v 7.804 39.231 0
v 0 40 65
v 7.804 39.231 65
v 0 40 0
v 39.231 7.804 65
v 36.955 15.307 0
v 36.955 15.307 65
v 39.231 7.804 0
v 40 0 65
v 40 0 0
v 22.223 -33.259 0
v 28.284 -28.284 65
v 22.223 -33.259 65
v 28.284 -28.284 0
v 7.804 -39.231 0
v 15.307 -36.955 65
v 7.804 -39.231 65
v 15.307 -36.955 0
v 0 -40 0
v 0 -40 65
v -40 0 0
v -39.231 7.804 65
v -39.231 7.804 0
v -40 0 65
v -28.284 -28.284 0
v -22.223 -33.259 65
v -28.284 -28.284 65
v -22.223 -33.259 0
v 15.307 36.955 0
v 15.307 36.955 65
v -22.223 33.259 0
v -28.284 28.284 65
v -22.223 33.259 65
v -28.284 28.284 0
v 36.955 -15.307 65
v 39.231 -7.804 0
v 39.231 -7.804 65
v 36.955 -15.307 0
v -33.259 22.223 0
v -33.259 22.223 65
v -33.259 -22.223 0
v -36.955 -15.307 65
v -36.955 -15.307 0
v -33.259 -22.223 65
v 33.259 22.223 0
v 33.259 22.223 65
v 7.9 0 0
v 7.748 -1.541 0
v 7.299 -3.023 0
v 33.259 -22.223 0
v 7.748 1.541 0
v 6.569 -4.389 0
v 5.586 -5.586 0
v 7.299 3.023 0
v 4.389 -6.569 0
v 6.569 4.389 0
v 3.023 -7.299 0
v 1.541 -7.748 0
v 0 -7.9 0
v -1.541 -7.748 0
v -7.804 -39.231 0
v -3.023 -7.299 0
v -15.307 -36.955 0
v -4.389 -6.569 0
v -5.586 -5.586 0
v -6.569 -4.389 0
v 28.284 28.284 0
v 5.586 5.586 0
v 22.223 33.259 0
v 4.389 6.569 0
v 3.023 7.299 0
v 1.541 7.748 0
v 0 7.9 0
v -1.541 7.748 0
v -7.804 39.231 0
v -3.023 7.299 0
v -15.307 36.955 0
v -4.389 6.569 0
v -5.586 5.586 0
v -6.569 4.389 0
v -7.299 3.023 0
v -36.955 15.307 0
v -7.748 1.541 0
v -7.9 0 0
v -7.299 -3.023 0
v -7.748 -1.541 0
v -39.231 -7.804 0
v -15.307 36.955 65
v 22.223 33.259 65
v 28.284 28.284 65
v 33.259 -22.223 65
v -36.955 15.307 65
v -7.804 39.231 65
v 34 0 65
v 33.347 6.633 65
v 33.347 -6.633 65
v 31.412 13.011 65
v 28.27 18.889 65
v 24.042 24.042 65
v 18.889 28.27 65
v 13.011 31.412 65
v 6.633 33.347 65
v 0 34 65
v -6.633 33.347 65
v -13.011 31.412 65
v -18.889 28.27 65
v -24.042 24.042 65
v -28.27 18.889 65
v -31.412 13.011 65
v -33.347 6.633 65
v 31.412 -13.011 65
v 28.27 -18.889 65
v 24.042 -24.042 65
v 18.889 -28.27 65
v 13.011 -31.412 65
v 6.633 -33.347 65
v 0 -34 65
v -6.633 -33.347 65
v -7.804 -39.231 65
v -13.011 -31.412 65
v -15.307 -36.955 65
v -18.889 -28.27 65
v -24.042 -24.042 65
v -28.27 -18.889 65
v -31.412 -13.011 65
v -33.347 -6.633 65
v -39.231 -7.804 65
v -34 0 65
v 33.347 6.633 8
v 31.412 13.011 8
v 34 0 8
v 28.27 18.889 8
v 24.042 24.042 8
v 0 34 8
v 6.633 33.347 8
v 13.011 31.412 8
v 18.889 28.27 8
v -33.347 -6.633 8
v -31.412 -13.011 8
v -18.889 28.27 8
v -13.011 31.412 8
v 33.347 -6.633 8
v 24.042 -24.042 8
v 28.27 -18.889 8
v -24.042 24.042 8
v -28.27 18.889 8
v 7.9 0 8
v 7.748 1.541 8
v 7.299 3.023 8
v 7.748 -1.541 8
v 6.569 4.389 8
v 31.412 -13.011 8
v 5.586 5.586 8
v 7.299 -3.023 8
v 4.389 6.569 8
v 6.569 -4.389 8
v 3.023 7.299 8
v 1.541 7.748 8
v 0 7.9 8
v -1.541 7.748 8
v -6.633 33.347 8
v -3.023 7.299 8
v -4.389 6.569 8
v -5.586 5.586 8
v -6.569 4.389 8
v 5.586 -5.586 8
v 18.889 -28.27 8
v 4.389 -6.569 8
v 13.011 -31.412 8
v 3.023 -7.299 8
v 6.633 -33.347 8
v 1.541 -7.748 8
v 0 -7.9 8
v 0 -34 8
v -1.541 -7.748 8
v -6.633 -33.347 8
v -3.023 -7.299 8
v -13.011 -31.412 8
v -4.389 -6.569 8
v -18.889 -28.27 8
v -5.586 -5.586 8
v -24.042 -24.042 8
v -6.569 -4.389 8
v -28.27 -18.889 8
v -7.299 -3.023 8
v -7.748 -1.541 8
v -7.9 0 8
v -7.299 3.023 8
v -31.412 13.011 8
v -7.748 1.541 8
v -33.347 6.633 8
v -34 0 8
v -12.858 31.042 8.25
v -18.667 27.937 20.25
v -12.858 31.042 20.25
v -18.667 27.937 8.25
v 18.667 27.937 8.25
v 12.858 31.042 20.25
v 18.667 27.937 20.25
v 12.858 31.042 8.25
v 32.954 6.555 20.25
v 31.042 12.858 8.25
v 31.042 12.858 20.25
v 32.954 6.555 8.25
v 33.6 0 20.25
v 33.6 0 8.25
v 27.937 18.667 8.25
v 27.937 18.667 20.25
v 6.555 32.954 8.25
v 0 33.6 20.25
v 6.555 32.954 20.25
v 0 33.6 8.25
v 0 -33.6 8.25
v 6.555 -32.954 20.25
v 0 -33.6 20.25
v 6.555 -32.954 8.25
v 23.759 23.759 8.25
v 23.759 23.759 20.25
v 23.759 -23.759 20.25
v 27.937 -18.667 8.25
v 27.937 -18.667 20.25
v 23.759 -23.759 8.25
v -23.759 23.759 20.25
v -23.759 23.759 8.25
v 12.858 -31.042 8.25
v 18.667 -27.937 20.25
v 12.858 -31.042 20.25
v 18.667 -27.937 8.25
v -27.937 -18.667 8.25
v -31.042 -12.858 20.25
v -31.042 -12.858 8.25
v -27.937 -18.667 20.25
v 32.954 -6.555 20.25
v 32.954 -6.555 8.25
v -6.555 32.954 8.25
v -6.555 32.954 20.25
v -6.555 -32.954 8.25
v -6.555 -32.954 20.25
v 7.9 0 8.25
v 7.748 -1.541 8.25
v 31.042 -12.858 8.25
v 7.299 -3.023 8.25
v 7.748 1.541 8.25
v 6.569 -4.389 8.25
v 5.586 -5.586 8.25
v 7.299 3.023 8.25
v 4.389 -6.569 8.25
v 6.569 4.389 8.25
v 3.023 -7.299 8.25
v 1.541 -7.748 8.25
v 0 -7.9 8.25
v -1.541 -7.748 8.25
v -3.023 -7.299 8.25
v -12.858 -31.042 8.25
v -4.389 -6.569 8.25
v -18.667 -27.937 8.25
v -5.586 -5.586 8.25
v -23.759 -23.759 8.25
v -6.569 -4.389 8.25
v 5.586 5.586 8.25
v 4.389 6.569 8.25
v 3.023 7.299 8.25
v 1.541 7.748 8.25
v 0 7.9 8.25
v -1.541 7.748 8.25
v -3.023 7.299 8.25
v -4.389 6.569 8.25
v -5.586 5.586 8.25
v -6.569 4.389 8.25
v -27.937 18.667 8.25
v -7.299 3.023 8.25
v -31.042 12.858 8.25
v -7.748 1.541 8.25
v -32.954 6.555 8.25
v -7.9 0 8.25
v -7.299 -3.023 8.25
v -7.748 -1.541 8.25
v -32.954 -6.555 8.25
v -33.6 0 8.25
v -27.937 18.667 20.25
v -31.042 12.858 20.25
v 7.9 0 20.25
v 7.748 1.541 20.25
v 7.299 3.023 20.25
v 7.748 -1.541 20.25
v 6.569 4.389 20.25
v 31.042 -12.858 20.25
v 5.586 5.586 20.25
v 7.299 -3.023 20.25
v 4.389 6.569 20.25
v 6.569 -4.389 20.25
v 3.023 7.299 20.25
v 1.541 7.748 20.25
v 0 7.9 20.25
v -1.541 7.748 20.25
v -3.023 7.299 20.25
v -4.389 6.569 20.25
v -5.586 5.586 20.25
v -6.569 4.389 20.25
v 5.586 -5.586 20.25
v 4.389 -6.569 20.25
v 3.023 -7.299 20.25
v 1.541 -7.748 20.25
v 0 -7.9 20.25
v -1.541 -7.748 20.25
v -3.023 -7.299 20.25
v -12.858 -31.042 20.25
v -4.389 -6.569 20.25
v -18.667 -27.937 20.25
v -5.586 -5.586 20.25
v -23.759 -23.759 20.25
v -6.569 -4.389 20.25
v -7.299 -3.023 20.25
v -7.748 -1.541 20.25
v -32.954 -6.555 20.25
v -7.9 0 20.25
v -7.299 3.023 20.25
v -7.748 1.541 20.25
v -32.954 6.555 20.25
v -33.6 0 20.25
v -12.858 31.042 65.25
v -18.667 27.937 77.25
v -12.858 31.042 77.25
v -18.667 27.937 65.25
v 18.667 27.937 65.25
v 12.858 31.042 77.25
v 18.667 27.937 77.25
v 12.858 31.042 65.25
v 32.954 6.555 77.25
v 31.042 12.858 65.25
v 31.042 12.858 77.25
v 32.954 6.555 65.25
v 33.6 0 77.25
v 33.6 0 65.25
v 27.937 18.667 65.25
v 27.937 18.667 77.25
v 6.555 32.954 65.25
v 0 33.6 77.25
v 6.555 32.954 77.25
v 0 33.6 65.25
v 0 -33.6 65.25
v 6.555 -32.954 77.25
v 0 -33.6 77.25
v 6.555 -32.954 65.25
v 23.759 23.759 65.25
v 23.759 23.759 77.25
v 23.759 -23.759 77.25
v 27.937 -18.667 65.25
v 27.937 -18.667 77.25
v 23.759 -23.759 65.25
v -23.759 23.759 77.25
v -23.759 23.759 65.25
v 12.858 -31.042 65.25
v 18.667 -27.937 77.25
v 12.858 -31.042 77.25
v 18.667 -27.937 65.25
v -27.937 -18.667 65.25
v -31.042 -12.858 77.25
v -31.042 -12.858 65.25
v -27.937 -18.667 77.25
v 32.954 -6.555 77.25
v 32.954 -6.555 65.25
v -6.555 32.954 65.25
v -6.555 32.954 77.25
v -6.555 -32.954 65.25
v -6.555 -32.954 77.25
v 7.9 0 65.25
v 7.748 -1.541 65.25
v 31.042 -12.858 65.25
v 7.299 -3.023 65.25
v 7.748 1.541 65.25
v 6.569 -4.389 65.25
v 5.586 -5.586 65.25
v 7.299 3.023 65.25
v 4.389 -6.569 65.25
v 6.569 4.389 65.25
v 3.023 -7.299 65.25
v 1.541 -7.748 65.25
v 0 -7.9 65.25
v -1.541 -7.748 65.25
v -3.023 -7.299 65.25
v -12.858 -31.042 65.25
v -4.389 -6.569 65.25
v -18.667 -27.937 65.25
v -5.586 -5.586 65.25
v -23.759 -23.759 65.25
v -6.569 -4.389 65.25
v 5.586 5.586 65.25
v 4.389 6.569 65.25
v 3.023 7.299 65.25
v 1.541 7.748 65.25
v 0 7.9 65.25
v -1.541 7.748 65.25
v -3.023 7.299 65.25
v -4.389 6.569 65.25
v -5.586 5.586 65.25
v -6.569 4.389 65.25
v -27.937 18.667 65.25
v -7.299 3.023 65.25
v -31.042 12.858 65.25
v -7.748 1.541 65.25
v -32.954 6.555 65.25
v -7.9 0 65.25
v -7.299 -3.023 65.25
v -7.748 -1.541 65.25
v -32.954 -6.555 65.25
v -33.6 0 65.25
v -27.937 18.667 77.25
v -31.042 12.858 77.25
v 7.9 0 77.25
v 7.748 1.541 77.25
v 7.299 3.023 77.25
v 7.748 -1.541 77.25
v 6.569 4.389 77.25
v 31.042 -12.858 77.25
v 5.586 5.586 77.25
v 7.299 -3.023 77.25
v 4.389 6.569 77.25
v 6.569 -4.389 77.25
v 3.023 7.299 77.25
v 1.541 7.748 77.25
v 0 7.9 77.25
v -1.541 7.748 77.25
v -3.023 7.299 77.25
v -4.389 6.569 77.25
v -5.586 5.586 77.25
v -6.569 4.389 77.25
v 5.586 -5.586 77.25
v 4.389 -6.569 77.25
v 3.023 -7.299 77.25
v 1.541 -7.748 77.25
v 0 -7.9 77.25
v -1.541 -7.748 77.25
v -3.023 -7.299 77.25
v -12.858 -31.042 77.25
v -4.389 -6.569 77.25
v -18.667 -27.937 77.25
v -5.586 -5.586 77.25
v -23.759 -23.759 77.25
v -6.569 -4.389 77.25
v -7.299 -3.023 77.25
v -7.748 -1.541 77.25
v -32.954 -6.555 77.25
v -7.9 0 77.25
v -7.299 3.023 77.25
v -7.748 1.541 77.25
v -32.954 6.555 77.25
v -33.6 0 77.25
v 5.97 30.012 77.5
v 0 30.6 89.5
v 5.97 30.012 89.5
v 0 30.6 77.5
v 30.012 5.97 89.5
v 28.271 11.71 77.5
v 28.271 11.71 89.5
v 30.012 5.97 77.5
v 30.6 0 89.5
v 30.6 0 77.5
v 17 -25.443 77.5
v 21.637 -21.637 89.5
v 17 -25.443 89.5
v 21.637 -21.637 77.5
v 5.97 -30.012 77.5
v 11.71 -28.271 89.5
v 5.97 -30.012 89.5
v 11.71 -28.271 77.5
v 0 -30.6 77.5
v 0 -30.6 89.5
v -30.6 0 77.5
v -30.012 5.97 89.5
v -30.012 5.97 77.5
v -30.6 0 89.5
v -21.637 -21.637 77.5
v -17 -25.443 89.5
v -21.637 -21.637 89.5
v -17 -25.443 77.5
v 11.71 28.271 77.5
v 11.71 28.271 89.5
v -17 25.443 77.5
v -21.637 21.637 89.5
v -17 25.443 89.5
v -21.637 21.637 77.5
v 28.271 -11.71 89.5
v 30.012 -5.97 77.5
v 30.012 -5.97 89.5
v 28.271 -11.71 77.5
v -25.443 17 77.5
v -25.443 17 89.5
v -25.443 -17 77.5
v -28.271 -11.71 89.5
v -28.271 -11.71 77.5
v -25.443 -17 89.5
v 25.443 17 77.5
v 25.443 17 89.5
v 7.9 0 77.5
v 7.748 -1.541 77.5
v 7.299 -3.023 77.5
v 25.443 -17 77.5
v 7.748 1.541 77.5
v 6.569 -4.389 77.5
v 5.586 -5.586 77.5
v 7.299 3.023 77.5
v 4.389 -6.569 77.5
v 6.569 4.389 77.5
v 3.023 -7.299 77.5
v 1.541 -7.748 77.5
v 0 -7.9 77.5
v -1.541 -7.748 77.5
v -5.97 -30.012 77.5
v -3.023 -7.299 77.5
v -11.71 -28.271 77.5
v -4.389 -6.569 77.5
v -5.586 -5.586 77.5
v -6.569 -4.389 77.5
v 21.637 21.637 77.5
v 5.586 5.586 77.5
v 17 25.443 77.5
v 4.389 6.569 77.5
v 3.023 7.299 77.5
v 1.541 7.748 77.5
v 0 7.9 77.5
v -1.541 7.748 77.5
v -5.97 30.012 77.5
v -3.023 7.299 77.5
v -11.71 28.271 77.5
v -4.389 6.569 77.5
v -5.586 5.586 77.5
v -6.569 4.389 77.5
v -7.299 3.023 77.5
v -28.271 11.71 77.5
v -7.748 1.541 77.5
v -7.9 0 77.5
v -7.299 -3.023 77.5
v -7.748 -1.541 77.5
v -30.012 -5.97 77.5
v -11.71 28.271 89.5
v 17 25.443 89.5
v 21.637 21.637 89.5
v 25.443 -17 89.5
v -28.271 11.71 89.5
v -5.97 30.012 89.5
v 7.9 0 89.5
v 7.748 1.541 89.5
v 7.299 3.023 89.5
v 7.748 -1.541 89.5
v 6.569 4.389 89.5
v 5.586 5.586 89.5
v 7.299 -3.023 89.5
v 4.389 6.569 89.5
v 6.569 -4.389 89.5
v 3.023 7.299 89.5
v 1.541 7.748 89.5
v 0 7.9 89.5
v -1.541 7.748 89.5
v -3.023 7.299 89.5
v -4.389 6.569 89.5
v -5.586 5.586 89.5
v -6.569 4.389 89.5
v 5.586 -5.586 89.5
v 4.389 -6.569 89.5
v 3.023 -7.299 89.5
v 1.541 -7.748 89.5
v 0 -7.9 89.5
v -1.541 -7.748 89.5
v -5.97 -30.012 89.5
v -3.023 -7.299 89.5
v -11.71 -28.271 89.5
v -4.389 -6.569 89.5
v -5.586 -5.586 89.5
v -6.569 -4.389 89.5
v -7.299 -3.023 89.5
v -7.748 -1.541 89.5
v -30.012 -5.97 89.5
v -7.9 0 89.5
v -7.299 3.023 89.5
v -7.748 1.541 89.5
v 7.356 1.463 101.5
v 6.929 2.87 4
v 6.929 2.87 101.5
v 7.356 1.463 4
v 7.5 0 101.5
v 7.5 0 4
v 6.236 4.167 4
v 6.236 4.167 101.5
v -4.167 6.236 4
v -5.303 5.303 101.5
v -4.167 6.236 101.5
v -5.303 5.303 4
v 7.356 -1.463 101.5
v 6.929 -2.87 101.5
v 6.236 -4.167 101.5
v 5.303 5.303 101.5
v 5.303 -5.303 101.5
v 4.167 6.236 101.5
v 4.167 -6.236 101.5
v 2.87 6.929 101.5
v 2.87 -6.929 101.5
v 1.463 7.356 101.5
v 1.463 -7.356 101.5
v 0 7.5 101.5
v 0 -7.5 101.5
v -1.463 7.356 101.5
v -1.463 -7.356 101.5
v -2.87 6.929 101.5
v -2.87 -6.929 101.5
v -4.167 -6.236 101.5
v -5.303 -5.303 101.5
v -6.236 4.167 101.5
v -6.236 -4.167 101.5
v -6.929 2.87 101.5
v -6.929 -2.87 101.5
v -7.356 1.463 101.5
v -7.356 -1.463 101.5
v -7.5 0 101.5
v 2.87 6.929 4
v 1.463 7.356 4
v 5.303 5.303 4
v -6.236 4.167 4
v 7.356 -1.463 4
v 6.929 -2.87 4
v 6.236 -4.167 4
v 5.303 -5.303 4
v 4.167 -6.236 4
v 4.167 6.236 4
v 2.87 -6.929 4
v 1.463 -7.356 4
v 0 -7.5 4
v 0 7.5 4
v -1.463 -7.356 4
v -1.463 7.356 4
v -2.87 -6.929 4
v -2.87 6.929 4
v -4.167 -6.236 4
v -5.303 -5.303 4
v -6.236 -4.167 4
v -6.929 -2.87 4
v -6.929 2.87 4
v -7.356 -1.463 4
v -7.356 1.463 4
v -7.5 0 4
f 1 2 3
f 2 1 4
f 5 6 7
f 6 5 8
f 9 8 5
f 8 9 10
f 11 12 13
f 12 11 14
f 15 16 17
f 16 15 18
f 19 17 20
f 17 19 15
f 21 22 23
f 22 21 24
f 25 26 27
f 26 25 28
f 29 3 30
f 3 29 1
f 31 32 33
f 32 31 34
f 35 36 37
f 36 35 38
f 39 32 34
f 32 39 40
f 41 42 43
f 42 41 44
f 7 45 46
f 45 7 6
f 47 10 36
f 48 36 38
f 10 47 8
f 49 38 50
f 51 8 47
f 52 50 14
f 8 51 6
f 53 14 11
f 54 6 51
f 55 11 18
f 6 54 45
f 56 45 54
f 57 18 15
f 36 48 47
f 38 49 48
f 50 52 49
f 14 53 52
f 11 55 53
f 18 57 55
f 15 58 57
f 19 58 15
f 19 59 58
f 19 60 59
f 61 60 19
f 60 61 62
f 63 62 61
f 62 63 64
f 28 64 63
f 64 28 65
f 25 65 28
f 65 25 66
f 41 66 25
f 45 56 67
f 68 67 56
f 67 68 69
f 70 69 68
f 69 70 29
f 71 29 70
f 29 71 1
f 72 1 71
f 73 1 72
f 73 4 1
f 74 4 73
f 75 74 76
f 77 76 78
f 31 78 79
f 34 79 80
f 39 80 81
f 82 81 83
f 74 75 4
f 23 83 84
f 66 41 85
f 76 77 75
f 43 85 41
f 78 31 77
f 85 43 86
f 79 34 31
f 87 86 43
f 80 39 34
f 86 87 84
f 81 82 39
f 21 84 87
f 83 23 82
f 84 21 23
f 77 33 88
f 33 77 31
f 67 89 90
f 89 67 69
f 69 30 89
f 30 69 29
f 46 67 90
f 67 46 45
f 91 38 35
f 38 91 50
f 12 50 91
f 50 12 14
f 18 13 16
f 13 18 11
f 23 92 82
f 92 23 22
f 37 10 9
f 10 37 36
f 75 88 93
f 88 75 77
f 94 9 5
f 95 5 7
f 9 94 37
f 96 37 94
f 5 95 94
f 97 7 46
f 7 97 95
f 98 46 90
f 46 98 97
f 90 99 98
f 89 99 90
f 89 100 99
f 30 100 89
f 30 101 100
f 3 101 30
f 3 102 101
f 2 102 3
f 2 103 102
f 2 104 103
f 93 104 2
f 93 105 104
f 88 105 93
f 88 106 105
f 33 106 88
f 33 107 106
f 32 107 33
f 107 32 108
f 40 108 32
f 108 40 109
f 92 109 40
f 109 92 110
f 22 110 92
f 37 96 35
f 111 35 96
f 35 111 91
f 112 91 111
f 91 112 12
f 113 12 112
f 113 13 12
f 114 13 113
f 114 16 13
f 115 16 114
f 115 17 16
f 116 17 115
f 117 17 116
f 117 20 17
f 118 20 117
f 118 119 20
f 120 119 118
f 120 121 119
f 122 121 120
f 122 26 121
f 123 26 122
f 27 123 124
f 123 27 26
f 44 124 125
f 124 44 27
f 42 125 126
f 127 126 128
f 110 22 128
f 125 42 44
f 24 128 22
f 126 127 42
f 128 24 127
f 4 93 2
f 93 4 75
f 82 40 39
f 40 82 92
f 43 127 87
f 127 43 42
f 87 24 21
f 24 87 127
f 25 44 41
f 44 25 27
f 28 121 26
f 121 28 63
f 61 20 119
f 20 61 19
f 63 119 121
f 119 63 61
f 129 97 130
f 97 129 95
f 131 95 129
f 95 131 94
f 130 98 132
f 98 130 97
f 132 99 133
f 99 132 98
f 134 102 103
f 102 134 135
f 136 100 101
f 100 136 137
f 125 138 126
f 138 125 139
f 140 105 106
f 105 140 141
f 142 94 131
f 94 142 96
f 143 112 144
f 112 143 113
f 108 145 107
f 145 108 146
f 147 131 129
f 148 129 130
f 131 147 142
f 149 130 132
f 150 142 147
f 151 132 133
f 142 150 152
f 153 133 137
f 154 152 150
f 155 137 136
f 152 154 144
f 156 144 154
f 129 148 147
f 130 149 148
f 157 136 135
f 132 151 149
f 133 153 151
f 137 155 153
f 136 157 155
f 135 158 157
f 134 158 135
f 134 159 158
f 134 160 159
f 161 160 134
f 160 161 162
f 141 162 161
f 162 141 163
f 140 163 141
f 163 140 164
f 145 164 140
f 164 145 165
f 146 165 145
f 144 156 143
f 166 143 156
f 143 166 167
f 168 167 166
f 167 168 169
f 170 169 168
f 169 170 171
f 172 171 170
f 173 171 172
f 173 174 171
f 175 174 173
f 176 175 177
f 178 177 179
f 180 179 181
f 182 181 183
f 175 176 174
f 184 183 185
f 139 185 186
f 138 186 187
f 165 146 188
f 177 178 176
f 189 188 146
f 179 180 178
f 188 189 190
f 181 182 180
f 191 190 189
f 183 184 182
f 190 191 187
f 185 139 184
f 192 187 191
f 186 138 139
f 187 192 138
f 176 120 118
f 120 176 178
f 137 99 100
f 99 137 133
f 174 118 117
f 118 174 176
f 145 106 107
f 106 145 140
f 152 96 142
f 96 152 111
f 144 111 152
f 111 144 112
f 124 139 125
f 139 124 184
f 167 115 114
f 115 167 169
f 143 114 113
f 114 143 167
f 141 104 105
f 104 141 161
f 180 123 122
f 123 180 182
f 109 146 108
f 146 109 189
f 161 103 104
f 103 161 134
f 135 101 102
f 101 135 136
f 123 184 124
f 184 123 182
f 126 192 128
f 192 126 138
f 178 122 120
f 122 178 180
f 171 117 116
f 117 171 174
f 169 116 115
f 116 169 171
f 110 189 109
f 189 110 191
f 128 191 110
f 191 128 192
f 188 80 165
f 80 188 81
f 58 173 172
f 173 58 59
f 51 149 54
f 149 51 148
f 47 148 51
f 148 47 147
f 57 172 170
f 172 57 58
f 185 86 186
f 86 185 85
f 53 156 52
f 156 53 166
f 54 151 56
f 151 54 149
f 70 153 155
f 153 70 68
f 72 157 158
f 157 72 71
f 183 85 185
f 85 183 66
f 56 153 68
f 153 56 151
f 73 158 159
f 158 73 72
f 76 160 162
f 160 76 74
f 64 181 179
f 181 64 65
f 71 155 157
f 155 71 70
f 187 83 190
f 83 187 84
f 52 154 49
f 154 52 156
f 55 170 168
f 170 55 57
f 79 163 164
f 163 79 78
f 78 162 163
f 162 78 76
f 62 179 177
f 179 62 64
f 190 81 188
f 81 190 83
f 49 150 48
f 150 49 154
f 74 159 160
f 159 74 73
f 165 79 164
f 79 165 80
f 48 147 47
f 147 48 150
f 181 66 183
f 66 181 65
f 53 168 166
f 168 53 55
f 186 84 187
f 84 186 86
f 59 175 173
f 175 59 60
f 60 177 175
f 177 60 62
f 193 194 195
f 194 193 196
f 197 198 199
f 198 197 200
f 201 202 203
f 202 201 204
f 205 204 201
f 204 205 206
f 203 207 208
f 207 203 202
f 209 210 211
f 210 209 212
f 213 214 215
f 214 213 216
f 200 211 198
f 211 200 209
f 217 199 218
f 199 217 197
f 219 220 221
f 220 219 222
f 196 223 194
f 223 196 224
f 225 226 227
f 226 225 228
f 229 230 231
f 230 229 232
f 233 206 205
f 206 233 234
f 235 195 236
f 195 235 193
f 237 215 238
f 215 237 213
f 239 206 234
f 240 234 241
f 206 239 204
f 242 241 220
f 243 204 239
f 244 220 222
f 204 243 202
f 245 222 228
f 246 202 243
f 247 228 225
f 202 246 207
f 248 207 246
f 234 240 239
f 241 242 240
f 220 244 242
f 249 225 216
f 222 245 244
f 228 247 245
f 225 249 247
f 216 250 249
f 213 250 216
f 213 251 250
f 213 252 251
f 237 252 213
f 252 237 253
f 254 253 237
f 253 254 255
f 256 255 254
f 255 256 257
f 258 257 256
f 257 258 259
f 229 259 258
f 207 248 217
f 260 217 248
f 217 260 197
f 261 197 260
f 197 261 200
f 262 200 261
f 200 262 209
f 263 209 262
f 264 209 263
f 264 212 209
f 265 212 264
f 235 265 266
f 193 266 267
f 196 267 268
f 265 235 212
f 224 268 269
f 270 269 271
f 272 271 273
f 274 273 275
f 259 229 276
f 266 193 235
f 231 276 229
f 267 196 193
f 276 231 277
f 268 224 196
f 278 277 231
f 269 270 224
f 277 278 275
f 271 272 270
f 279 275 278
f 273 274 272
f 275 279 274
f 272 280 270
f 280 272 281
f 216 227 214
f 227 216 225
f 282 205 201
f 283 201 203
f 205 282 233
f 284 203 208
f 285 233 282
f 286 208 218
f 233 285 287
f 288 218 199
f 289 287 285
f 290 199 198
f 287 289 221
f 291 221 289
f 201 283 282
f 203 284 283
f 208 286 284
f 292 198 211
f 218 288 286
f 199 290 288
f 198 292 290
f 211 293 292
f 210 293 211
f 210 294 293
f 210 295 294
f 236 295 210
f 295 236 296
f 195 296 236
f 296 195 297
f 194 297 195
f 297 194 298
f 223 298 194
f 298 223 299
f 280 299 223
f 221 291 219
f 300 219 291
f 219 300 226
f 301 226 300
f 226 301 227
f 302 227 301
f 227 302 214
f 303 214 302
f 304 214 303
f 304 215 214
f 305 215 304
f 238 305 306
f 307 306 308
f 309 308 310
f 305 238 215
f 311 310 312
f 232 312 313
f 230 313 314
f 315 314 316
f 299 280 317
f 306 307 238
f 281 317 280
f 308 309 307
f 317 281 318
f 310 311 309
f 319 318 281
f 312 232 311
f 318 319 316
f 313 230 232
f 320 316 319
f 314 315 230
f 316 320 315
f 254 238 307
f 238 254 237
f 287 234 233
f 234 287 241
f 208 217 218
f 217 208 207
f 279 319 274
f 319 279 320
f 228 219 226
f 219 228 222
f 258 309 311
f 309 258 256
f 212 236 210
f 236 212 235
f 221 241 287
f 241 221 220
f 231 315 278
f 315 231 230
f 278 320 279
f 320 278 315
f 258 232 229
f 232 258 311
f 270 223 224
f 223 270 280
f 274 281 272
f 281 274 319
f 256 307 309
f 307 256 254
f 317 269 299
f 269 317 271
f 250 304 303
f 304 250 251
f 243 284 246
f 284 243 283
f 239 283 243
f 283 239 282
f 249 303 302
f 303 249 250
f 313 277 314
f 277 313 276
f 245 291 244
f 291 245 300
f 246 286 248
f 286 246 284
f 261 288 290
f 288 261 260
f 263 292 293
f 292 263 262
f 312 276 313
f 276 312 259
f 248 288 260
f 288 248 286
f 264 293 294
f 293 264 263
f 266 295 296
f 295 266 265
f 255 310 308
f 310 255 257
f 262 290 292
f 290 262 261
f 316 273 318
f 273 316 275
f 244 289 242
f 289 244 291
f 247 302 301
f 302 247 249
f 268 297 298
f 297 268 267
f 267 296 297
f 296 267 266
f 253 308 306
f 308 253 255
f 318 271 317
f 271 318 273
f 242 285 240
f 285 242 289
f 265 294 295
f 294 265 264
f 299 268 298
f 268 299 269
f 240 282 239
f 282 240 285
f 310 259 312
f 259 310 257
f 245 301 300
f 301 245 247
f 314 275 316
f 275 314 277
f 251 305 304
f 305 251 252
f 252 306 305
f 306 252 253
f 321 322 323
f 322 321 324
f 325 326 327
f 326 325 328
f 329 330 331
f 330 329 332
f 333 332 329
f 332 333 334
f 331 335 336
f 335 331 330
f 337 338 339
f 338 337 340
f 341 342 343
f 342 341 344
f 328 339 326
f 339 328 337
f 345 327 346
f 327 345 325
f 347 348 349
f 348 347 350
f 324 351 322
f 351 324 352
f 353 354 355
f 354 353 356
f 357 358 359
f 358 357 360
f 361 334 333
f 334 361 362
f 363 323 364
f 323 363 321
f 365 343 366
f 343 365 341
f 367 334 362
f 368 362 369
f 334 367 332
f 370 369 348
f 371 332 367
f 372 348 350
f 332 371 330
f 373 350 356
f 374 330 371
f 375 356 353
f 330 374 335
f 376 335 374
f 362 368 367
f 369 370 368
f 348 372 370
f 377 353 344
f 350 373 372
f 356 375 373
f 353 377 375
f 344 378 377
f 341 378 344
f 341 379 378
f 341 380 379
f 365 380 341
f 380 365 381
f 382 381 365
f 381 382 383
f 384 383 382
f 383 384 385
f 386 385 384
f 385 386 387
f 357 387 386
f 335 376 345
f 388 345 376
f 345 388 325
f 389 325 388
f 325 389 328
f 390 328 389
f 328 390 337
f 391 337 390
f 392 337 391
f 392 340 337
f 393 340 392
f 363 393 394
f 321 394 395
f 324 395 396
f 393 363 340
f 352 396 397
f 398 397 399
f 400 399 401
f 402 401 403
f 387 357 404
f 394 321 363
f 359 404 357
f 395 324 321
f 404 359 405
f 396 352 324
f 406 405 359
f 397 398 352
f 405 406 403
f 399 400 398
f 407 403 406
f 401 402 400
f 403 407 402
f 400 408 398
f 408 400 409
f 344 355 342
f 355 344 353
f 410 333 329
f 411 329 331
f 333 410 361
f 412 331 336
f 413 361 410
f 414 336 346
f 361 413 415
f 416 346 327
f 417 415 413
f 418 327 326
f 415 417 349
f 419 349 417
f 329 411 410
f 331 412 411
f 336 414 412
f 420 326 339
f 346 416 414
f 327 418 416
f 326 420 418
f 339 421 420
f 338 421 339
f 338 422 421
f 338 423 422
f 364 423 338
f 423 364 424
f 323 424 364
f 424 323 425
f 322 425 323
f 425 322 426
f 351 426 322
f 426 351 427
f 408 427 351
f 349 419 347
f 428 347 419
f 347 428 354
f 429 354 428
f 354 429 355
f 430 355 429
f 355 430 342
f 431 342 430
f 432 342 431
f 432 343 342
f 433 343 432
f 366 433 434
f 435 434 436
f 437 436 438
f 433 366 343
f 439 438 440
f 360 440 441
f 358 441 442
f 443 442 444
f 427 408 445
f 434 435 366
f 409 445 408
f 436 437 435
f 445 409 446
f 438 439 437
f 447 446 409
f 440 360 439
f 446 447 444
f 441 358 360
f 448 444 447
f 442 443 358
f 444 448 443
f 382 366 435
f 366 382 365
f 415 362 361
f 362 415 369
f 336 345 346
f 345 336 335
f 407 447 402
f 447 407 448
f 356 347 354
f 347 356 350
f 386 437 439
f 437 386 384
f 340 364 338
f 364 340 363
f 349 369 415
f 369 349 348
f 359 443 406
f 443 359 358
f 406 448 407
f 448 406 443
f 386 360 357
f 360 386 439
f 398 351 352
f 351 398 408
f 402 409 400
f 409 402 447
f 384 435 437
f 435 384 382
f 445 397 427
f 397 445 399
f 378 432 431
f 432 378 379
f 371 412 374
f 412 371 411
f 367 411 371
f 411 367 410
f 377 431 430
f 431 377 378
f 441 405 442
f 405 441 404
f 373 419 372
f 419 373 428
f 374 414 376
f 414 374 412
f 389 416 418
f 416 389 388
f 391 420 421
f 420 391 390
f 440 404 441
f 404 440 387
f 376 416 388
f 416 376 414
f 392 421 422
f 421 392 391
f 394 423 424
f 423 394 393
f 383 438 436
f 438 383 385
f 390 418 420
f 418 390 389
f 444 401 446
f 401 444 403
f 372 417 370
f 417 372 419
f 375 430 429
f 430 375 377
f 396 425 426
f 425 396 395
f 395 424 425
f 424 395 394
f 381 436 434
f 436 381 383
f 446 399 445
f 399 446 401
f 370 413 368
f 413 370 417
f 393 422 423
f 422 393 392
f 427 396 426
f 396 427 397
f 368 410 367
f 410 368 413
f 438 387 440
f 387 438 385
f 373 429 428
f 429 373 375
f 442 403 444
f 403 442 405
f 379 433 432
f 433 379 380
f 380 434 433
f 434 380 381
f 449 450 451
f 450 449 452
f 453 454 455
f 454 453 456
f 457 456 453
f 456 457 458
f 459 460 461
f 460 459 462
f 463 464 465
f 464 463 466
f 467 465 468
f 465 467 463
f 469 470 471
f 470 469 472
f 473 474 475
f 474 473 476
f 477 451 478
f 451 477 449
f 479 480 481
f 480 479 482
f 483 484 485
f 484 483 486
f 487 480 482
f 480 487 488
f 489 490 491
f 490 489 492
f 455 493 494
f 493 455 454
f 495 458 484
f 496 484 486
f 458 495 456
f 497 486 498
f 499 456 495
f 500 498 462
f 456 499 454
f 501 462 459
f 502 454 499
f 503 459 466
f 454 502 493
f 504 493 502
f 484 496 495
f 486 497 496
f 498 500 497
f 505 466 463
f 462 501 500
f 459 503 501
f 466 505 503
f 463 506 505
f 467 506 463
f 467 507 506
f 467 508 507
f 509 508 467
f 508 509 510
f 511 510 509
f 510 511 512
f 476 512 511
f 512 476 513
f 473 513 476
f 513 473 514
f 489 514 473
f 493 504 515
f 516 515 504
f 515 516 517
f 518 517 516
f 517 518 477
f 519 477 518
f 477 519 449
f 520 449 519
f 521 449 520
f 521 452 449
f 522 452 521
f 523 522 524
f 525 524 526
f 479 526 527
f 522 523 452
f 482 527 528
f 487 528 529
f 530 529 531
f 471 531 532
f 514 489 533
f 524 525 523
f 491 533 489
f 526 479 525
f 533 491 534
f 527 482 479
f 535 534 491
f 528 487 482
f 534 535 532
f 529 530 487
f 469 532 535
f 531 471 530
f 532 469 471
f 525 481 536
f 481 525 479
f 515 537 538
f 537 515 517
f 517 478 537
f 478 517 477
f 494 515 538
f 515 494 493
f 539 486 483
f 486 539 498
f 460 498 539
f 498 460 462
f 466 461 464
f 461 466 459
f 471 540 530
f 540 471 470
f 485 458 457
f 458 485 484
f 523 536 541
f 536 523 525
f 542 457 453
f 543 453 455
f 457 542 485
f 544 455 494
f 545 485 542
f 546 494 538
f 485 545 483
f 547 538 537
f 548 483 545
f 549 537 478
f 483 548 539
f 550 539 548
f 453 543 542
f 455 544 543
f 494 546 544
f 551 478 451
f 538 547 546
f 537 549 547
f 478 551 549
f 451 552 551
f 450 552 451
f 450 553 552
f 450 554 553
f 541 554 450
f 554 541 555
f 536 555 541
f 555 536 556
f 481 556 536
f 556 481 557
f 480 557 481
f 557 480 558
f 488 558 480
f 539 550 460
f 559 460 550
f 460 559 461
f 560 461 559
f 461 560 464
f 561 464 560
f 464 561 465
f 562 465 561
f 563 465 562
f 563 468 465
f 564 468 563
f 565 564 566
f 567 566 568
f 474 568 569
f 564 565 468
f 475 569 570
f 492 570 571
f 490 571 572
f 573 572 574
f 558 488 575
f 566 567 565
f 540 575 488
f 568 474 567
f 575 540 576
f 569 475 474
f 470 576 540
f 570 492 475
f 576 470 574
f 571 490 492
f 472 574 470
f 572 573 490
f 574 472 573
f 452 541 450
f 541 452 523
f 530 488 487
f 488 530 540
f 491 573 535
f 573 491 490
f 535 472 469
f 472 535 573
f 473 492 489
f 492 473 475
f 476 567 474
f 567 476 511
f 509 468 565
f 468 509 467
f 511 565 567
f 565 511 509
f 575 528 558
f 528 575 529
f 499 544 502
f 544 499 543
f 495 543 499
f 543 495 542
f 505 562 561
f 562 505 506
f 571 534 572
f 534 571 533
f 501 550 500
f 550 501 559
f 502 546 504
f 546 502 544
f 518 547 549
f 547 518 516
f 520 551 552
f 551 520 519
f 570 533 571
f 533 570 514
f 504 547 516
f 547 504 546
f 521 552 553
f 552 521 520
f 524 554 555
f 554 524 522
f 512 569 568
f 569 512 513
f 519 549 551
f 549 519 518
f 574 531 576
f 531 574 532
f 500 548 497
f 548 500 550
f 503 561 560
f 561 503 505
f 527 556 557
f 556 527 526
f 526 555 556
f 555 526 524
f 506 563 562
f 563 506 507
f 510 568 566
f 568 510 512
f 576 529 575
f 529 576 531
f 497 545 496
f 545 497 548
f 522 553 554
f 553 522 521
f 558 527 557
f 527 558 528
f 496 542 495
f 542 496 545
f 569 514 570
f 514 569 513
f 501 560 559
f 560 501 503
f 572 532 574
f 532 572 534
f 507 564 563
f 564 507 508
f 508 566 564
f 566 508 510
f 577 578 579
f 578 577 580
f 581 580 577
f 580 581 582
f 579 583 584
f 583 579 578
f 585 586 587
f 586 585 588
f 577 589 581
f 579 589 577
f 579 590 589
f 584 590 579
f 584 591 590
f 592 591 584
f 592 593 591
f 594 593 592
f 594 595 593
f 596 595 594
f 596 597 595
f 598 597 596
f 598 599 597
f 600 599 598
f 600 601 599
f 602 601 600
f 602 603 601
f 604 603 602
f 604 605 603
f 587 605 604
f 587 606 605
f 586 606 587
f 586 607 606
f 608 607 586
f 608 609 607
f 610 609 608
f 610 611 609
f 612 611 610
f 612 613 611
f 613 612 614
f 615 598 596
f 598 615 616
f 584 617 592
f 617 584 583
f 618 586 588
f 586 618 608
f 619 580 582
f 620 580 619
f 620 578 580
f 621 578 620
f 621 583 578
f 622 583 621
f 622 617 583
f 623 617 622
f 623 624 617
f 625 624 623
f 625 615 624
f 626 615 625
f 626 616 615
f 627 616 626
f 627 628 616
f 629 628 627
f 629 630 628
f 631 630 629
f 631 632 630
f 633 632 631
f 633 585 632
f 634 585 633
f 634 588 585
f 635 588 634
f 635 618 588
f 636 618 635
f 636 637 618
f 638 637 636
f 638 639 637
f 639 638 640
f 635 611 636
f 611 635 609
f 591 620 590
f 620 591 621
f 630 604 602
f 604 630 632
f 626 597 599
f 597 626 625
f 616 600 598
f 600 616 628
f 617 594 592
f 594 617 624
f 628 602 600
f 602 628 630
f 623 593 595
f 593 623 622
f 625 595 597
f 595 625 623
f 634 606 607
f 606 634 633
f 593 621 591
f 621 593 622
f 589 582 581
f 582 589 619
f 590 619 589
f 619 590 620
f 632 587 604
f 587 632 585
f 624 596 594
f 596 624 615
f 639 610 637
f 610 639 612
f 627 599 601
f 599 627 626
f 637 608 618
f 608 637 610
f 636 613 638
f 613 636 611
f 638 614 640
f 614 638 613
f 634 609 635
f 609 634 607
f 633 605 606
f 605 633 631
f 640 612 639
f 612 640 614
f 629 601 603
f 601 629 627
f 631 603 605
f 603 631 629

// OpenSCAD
$fn = 32;

// ------------------------------------------------------------------------
// Bearing housing: housing d80, two bearings and a shaft
// Every part is its own module, assembly() places them once.
// ------------------------------------------------------------------------

// --- part 1 ---
module housing() {
  difference() {
    cylinder(h = 65, d = 80);
    translate([0, 0, 8]) cylinder(h = 58, d = 68);
    translate([0, 0, -1]) cylinder(h = 10, d = 15.8);
  }
}

// --- part 2 ---
module bearing_lower() {
  difference() {
      translate([0, 0, 0]) cylinder(h = 12, d = 67.2);
      translate([0, 0, -1]) cylinder(h = 14, d = 15.8);
    }
}

// --- part 3 ---
module bearing_upper() {
  difference() {
      translate([0, 0, 0]) cylinder(h = 12, d = 67.2);
      translate([0, 0, -1]) cylinder(h = 14, d = 15.8);
    }
}

// --- part 4 ---
module spacer() {
  difference() {
      translate([0, 0, 0]) cylinder(h = 12, d = 61.2);
      translate([0, 0, -1]) cylinder(h = 14, d = 15.8);
    }
}

// --- part 5 ---
module shaft() {
  translate([0, 0, -48.75]) cylinder(h = 97.5, d = 15);
}

// --- assembly ---
module assembly() {
  translate([0, 0, 0]) rotate([0, 0, 0]) housing();
  translate([0, 0, 8.25]) rotate([0, 0, 0]) bearing_lower();
  translate([0, 0, 65.25]) rotate([0, 0, 0]) bearing_upper();
  translate([0, 0, 77.5]) rotate([0, 0, 0]) spacer();
  translate([0, 0, 52.75]) rotate([0, 0, 0]) shaft();
}

assembly();
